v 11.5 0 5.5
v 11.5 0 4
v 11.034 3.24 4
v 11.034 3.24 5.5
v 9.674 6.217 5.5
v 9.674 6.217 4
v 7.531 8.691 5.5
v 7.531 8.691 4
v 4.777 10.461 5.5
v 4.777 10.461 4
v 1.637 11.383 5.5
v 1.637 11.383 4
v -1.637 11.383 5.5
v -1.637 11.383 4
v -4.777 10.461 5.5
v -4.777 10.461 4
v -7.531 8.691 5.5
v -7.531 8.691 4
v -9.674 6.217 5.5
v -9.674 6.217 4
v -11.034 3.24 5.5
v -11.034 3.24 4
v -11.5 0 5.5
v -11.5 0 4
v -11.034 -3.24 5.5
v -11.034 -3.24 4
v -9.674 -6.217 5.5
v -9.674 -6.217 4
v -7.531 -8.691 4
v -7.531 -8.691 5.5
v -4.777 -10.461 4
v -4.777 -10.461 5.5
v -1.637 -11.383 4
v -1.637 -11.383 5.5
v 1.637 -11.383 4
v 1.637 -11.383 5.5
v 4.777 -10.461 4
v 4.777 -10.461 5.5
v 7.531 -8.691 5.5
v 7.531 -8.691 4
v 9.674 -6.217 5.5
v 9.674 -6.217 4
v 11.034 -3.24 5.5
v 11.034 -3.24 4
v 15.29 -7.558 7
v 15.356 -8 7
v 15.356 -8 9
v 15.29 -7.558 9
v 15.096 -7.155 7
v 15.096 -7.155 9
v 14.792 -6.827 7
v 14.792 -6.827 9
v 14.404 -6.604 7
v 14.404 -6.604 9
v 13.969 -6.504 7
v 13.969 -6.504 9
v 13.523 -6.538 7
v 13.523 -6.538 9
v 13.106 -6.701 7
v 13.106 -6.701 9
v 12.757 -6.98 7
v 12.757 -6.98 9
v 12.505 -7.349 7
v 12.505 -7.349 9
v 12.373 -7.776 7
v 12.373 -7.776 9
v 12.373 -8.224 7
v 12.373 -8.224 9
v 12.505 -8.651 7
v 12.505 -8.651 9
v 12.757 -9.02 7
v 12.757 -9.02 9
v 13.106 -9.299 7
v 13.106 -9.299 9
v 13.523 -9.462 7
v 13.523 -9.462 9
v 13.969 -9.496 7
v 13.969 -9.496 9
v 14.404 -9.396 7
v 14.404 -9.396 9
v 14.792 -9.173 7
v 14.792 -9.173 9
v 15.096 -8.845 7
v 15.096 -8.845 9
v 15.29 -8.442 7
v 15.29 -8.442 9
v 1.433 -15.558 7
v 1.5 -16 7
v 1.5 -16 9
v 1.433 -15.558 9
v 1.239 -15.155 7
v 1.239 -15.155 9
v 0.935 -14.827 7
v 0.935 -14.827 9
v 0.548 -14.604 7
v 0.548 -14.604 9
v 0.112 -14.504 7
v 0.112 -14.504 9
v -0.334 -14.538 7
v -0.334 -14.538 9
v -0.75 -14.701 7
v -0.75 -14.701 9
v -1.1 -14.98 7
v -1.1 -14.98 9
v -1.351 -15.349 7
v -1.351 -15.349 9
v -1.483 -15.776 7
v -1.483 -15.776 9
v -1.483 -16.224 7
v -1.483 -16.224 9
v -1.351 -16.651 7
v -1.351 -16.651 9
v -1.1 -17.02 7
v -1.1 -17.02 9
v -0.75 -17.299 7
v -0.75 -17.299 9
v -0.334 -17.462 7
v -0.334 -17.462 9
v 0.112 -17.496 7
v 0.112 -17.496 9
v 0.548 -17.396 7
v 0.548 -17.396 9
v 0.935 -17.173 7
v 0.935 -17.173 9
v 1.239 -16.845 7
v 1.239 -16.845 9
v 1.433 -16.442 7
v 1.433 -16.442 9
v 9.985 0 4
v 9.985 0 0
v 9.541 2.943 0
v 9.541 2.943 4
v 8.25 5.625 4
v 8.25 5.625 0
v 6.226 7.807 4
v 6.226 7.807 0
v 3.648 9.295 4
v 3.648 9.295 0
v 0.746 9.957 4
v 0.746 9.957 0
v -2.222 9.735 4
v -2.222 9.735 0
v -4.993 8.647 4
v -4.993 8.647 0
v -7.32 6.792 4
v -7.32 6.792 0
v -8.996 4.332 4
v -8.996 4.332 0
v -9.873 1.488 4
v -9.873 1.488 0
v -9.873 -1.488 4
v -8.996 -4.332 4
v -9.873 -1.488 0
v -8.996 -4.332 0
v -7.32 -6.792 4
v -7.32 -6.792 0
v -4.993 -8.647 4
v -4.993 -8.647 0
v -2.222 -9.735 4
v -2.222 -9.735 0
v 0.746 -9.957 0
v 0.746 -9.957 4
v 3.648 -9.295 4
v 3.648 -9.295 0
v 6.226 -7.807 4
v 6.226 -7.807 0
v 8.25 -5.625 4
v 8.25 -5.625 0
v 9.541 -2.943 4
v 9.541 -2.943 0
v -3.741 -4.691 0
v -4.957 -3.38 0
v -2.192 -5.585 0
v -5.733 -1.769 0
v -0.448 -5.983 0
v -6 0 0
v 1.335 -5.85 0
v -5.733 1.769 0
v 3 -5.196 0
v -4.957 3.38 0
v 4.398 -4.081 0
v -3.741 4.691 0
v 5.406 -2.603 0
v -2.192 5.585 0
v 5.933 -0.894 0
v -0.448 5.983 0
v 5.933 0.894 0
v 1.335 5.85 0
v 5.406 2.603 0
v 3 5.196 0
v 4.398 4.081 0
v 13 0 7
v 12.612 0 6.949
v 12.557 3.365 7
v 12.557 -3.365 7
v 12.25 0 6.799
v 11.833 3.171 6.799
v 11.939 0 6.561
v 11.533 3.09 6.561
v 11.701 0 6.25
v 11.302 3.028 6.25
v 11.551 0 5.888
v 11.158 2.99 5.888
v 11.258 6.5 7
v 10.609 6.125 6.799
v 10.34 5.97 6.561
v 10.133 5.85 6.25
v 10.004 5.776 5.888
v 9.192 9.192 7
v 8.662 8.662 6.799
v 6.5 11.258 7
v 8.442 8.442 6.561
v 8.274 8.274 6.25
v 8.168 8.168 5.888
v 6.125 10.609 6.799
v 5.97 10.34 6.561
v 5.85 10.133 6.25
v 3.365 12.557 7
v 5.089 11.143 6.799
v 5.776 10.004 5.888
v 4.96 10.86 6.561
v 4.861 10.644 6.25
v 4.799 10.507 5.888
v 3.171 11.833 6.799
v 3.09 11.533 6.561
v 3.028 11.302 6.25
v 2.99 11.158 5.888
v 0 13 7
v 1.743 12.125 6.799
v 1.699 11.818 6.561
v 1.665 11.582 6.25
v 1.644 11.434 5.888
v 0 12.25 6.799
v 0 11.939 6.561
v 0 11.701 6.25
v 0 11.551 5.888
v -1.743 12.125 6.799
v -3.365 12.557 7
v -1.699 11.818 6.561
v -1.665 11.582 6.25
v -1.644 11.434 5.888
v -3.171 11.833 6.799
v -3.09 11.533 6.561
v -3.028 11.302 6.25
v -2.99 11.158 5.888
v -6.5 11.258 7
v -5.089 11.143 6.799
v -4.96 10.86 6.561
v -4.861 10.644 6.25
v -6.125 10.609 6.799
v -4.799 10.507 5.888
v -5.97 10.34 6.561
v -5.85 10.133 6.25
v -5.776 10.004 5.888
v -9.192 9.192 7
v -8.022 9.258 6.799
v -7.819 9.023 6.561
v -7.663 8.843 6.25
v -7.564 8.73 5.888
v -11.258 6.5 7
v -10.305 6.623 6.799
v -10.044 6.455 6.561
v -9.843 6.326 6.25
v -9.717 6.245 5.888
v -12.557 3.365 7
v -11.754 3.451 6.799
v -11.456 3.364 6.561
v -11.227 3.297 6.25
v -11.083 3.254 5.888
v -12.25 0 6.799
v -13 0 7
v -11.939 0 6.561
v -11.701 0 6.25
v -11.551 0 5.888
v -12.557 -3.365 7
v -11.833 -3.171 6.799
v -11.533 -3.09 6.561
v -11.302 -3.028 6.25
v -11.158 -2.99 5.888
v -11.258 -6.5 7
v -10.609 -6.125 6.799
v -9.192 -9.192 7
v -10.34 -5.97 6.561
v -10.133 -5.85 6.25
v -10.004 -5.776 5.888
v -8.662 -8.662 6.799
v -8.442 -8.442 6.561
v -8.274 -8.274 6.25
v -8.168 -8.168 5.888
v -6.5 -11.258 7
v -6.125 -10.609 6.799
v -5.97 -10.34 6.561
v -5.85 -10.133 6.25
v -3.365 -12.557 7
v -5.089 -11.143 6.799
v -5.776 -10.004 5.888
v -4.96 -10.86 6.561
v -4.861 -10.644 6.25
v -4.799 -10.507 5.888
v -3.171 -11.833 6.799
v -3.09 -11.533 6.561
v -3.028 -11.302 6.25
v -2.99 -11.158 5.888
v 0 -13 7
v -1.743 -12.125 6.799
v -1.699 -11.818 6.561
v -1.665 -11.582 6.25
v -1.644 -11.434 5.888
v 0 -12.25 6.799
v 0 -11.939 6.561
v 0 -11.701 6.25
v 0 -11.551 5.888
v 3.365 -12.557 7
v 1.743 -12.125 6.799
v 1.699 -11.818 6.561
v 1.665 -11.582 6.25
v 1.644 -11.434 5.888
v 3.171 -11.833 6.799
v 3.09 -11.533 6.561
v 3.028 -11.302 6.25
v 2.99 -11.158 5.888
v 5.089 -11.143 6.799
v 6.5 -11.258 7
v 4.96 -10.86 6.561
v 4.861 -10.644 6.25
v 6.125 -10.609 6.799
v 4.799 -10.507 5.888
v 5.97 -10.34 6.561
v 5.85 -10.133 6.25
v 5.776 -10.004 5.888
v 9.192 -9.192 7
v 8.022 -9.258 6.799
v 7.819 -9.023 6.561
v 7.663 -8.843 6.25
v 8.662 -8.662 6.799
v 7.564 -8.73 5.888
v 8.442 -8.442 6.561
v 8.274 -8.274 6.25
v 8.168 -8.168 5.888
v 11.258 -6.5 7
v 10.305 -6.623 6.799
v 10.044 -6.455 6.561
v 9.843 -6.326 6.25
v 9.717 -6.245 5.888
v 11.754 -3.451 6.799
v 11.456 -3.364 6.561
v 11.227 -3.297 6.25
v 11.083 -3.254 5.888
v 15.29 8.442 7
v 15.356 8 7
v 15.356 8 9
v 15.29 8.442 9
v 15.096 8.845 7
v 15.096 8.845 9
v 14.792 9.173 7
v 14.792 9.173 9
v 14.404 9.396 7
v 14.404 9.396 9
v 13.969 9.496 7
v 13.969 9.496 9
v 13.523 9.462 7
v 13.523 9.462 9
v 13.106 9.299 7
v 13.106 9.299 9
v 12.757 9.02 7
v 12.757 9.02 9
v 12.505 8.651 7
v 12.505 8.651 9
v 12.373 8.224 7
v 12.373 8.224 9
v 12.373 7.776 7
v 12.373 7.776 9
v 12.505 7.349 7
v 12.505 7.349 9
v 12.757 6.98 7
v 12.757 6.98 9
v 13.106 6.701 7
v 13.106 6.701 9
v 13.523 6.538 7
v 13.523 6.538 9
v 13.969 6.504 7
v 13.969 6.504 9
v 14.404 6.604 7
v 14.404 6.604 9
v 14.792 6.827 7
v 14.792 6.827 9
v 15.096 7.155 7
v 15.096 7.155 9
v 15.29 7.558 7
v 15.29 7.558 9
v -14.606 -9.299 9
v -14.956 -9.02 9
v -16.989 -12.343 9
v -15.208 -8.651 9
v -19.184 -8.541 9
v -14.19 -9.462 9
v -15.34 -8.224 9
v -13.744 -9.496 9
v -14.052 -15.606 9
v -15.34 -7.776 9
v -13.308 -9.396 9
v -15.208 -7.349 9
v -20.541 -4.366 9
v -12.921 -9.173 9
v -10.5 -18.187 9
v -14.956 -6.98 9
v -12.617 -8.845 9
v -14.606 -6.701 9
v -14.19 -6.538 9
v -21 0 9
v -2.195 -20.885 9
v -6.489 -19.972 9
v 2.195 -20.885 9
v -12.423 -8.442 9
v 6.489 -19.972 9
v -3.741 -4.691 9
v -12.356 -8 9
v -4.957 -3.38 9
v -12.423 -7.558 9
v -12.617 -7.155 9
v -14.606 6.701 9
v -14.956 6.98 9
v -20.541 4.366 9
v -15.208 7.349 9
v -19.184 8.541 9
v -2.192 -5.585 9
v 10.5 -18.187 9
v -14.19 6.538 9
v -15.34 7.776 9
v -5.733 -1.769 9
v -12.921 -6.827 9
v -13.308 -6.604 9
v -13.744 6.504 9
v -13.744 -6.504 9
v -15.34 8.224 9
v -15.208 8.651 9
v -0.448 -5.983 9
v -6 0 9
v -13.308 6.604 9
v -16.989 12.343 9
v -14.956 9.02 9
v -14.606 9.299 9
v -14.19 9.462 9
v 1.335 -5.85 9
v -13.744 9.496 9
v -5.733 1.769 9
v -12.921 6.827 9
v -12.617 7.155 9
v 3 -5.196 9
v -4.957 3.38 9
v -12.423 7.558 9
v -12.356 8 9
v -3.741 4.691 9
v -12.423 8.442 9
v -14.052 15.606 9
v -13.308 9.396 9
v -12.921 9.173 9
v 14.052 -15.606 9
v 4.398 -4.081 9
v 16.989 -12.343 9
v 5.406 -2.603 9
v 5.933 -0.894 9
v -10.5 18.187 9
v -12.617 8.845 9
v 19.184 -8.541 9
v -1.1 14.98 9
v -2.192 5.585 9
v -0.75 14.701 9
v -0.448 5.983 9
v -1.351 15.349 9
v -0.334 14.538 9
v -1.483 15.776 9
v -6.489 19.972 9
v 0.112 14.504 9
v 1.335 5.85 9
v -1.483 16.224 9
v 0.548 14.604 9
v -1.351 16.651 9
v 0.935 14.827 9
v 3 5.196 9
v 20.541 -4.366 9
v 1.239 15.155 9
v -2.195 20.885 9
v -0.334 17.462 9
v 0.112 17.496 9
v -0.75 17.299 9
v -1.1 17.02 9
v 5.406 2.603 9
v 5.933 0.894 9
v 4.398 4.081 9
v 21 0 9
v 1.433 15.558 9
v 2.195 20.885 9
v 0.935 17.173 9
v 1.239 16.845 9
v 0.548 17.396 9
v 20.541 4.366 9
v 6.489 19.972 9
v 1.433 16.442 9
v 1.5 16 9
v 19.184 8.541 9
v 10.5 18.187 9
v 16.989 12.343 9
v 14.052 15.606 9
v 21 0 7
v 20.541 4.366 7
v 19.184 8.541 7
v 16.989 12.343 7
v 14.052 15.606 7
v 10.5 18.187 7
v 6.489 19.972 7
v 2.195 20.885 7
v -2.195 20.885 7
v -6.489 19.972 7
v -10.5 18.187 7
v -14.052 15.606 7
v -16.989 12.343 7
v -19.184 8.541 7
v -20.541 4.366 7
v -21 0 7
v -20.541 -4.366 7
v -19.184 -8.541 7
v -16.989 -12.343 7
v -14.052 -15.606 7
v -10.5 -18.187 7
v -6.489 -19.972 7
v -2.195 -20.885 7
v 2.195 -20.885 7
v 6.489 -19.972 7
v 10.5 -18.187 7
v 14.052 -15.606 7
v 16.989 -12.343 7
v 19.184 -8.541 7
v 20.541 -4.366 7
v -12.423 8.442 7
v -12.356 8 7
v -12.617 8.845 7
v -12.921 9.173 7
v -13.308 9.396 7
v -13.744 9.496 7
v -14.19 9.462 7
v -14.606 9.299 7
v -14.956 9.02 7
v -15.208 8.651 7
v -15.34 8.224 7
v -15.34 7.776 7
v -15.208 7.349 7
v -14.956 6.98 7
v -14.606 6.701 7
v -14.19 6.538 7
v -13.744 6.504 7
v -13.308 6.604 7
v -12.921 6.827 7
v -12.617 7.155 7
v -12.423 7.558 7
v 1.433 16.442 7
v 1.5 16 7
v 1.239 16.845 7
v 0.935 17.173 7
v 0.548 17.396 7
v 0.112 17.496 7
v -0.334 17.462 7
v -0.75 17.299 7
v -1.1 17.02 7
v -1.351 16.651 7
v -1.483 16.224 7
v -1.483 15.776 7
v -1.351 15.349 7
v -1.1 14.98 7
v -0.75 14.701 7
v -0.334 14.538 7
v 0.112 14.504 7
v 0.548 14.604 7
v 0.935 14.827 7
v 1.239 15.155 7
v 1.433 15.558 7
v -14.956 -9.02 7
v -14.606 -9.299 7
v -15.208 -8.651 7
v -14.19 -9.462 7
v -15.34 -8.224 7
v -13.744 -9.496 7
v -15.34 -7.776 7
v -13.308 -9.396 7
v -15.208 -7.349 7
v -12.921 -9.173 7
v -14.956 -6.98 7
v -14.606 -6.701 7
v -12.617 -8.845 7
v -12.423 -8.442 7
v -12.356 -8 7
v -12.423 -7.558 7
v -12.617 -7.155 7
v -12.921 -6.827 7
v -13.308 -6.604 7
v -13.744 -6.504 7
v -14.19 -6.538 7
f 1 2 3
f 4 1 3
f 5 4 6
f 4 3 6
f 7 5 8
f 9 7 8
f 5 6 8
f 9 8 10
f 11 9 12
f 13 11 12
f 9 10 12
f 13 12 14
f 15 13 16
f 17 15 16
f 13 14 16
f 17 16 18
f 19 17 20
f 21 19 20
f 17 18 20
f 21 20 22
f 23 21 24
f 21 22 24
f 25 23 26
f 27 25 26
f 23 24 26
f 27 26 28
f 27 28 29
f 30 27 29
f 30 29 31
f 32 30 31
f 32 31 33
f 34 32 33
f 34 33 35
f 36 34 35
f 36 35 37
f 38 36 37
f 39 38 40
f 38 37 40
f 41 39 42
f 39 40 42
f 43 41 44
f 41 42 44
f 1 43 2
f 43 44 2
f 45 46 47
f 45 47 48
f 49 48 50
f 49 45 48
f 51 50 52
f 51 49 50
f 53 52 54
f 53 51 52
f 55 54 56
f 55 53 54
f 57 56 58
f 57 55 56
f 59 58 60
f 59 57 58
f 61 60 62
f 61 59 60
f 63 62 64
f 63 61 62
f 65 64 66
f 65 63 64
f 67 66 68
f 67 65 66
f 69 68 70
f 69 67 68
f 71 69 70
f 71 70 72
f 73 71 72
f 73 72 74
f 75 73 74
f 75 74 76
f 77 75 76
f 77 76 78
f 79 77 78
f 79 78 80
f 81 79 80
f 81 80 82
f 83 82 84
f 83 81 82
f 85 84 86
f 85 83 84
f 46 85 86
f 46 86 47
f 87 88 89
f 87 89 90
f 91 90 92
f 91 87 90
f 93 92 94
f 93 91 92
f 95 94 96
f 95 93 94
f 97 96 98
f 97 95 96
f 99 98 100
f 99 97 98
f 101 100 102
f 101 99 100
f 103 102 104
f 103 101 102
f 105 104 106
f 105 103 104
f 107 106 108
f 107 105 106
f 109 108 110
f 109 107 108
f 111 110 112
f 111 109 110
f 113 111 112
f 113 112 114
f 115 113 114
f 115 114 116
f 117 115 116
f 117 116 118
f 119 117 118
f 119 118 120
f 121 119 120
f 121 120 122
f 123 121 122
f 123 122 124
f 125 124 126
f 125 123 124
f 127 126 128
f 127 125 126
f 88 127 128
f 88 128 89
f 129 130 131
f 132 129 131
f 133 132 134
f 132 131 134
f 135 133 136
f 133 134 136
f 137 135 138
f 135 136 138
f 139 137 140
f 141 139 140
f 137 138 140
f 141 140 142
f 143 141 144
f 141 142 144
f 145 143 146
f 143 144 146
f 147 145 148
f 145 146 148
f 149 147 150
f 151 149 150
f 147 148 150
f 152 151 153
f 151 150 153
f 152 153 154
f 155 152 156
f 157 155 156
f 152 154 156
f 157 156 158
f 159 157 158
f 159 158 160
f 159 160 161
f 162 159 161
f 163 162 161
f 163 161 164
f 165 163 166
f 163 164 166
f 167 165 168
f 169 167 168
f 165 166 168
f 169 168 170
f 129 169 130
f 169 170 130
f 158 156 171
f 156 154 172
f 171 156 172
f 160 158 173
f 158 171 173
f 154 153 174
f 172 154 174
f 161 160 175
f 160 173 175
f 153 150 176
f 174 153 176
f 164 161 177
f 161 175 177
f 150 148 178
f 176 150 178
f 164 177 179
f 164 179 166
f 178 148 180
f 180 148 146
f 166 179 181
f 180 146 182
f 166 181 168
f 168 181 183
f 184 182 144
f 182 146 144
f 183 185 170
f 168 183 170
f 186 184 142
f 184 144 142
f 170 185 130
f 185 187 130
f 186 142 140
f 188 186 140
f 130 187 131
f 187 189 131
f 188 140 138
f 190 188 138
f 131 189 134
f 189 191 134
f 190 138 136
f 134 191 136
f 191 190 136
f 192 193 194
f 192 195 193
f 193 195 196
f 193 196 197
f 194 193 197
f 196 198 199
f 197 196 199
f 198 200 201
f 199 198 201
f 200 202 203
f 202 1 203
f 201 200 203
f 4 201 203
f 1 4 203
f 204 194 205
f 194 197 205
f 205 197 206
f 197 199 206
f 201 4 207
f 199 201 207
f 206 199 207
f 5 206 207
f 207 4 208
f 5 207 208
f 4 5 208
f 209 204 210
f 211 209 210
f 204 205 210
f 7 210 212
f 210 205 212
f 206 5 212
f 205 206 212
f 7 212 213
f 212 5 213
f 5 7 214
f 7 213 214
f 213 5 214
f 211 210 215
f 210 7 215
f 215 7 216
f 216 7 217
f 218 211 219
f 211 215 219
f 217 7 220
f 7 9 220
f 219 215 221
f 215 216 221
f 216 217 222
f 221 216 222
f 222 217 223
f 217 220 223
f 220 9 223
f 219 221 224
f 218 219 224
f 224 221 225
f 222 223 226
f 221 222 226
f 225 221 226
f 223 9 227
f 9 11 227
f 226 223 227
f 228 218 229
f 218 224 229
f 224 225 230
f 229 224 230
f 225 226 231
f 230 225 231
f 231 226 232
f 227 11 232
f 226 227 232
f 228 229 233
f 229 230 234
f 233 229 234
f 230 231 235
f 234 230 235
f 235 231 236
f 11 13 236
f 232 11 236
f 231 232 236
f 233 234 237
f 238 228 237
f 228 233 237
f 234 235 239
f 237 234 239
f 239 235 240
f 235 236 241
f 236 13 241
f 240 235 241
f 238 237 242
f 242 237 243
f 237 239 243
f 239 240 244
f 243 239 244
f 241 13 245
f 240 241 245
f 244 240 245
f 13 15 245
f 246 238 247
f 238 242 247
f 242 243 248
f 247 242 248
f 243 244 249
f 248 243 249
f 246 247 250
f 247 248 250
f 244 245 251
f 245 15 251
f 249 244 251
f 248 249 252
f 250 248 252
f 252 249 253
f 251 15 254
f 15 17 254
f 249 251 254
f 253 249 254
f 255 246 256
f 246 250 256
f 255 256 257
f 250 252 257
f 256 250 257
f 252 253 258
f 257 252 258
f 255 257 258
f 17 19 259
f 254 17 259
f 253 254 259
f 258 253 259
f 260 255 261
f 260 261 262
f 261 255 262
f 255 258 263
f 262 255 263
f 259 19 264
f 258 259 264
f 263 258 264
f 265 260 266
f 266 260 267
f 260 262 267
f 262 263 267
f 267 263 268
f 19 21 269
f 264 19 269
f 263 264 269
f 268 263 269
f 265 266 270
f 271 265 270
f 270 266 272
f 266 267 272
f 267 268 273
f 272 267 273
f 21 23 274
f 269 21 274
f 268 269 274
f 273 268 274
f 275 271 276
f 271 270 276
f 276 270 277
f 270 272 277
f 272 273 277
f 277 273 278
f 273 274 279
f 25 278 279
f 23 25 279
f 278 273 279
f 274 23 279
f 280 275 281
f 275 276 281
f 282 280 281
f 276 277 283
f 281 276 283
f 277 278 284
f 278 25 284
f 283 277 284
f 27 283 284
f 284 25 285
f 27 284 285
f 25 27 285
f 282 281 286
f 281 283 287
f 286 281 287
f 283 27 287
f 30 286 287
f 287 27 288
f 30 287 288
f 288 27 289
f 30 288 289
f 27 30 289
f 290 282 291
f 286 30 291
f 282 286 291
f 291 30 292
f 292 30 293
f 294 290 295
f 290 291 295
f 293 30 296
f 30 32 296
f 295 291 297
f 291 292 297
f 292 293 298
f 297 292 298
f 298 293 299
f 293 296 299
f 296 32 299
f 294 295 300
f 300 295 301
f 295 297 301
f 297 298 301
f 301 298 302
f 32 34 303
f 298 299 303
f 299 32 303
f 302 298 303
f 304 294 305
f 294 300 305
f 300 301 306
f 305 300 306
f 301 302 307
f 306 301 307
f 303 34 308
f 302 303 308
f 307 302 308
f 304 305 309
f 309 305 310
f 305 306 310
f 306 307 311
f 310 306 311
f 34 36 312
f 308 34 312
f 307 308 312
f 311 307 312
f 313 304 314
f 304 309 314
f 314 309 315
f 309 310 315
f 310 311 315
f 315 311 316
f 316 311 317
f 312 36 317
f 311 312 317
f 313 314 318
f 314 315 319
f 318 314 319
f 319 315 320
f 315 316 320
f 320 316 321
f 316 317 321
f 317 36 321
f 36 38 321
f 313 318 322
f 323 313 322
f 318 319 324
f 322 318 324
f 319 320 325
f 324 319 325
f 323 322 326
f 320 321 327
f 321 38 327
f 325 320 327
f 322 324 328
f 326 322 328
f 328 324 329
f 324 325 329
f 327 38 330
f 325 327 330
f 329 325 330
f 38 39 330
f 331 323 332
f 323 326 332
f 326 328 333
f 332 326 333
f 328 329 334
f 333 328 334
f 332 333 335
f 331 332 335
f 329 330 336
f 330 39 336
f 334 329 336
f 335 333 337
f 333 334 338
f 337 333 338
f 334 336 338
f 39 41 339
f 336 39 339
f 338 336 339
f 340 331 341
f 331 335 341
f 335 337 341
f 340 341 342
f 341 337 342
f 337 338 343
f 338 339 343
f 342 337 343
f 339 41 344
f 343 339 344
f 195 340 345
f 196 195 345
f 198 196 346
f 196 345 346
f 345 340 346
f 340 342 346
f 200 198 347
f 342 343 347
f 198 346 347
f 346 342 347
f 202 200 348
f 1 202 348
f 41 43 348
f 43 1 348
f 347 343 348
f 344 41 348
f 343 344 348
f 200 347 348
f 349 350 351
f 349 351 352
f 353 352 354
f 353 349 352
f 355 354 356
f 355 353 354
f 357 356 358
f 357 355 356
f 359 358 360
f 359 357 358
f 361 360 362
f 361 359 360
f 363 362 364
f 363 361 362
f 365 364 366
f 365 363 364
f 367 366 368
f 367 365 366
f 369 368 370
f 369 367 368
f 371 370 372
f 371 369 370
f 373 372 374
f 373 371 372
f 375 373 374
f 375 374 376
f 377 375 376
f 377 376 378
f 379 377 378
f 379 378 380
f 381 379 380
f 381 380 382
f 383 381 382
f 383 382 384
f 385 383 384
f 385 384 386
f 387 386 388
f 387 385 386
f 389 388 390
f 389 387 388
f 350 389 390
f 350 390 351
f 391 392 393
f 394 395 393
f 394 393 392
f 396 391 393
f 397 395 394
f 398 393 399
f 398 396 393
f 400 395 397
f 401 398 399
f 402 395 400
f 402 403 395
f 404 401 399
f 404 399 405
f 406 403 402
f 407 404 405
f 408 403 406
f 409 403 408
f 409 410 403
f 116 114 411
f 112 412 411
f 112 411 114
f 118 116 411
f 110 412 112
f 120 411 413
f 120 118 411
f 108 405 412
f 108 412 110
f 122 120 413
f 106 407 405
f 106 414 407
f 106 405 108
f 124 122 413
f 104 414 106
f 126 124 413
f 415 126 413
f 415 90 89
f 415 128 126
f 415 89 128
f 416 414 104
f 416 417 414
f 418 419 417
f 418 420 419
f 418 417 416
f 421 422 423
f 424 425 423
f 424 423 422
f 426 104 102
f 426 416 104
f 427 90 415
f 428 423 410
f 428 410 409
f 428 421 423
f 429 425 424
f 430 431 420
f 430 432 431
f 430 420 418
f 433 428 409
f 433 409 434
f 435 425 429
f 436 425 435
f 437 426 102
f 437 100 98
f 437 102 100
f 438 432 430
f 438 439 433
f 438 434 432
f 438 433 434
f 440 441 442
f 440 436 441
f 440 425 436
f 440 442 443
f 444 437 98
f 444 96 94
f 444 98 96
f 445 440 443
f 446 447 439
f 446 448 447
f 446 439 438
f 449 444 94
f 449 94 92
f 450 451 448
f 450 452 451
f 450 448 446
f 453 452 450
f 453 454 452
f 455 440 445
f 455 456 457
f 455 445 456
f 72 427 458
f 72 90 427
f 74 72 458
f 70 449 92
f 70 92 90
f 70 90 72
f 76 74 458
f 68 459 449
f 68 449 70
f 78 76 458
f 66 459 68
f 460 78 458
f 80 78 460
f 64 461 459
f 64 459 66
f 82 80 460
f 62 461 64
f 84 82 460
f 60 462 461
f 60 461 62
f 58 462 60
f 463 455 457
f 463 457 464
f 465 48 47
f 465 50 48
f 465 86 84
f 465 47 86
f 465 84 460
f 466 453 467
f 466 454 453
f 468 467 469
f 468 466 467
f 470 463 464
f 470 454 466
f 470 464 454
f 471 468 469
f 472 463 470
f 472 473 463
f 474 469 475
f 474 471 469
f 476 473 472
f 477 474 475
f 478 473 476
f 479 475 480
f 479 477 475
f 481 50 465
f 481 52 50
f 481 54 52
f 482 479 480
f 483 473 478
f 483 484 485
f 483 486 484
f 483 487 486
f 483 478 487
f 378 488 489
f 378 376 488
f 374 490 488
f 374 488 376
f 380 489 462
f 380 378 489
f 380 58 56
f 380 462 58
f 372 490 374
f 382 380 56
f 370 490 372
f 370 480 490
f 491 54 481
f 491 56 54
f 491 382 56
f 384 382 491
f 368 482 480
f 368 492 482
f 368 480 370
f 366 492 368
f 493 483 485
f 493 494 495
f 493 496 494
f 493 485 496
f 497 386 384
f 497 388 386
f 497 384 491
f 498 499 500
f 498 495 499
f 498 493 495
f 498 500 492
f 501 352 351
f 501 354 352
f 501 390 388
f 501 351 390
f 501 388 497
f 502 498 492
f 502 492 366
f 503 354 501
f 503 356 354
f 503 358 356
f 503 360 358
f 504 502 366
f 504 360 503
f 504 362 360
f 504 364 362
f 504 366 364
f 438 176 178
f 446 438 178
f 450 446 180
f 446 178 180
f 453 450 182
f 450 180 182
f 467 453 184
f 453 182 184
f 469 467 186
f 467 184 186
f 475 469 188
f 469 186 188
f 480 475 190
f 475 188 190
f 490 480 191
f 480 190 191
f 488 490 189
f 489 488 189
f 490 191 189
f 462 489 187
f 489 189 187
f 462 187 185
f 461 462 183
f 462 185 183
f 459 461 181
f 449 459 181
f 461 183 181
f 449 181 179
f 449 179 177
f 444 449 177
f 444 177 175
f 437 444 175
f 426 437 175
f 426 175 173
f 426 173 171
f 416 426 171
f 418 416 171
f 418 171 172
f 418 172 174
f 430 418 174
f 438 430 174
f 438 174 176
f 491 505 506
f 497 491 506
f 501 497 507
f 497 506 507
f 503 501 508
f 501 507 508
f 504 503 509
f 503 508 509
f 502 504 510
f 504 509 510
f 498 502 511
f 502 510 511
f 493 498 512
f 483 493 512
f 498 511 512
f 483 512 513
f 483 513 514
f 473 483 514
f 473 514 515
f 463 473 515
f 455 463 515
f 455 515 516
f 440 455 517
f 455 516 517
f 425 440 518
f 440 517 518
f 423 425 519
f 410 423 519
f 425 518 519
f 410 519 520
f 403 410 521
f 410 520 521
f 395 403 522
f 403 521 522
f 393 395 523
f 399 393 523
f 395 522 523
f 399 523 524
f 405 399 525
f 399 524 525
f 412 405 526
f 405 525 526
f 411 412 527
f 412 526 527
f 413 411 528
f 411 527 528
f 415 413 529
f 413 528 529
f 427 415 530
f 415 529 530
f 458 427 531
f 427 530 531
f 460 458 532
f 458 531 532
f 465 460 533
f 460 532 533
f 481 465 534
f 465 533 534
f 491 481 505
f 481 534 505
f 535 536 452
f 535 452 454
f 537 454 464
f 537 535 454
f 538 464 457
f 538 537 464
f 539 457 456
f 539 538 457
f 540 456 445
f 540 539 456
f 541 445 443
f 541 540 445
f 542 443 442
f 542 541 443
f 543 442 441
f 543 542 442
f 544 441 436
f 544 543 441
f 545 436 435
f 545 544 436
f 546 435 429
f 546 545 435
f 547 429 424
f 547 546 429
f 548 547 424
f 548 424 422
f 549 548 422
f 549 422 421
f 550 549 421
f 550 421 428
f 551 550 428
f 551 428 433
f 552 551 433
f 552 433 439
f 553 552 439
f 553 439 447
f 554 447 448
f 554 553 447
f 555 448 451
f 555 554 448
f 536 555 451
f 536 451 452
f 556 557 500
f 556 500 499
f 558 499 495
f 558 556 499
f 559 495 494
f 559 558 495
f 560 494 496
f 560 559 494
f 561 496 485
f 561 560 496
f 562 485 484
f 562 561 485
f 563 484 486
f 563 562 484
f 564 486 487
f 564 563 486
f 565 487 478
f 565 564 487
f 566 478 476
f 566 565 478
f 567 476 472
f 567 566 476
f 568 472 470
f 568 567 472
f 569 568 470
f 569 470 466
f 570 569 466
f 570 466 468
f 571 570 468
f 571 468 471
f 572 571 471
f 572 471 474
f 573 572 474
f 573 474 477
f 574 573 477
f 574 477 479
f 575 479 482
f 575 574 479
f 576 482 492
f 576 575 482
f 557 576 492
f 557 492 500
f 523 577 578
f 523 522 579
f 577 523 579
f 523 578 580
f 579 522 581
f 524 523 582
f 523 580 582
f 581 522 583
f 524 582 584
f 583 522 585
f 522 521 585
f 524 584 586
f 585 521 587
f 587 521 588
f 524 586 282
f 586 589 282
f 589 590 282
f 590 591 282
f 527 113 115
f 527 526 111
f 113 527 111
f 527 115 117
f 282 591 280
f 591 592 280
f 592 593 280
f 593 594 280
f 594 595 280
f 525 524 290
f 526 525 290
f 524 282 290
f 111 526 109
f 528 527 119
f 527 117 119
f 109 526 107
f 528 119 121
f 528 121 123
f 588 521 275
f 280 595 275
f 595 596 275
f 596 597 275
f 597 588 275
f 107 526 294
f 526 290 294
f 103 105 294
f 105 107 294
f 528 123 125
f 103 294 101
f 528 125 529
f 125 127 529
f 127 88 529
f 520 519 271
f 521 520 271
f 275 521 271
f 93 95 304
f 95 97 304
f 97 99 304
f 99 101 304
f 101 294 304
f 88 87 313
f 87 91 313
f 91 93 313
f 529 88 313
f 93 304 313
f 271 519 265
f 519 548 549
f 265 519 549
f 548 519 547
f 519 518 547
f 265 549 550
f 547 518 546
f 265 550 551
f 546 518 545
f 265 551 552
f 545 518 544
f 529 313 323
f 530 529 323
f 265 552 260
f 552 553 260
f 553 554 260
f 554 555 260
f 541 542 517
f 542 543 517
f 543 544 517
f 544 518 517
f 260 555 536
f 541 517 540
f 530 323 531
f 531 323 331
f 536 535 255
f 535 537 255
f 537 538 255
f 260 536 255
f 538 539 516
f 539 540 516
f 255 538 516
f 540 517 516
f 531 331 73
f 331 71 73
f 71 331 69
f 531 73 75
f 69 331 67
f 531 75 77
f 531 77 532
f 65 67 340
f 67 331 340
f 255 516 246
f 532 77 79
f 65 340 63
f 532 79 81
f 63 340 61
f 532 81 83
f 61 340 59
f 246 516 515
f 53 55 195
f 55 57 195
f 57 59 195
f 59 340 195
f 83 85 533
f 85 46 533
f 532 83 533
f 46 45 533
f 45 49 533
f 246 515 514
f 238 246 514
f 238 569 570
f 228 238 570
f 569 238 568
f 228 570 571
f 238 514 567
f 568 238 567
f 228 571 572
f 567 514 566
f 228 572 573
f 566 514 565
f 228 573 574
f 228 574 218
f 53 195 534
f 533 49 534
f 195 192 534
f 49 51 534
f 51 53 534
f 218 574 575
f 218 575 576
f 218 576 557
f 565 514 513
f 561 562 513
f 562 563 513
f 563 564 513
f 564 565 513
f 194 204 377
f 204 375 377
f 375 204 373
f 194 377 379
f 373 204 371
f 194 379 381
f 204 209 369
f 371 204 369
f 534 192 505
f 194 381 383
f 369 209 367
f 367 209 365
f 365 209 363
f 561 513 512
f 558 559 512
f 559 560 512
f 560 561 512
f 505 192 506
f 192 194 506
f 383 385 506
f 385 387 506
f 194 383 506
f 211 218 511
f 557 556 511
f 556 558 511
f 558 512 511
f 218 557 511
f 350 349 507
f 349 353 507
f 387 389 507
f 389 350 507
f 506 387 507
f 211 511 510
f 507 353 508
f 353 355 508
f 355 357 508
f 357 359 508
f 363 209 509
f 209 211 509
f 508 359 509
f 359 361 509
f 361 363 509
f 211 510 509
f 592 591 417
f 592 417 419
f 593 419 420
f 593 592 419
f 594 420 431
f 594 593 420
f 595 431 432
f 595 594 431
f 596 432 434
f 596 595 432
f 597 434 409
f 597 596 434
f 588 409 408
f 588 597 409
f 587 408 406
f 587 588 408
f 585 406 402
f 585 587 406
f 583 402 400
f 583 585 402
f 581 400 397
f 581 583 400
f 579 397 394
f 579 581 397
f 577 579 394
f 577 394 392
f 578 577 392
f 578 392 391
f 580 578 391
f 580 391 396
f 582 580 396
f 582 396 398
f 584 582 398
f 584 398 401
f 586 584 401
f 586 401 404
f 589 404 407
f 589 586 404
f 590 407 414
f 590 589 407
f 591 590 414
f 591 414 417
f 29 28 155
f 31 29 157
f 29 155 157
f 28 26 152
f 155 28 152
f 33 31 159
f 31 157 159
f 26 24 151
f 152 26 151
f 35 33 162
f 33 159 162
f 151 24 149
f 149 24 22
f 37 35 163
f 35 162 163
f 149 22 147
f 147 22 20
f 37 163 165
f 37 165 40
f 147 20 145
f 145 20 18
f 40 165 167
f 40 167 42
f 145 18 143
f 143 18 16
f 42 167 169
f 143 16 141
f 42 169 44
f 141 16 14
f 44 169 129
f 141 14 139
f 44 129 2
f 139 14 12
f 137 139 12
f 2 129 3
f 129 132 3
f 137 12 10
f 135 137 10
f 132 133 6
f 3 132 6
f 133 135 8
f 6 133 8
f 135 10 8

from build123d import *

# Parameters (mm, degrees)
SKETCH_1_R          = 9.985
EXTRUDE_1_DEPTH     = 4
SKETCH_2_R          = 11.5
EXTRUDE_2_DEPTH     = 3
SKETCH_3_R          = 21
SKETCH_3_R_2        = 1.5
EXTRUDE_3_DEPTH     = 2
SKETCH_4_R          = 6
CUT_EXTRUDE_1_DEPTH = 32.032241298
FILLET_1_R          = 1.5


with BuildPart() as part:
    # 草图1 → 凸台-拉伸1 (new body)
    with BuildSketch(Plane.XY):
        Circle(SKETCH_1_R)
    extrude(amount=EXTRUDE_1_DEPTH)

    # 草图2 → 凸台-拉伸2 (add)
    with BuildSketch(Plane.XY.offset(4)):
        Circle(SKETCH_2_R)
    extrude(amount=EXTRUDE_2_DEPTH)

    # 草图3 → 凸台-拉伸3 (add)
    with BuildSketch(Plane.XY.offset(7)):
        Circle(SKETCH_3_R)
        with Locations((0, 16)):
            Circle(SKETCH_3_R_2, mode=Mode.SUBTRACT)
        with Locations((13.856406461, 8)):
            Circle(SKETCH_3_R_2, mode=Mode.SUBTRACT)
        with Locations((13.856406461, -8)):
            Circle(SKETCH_3_R_2, mode=Mode.SUBTRACT)
        with Locations((0, -16)):
            Circle(SKETCH_3_R_2, mode=Mode.SUBTRACT)
        with Locations((-13.856406461, -8)):
            Circle(SKETCH_3_R_2, mode=Mode.SUBTRACT)
        with Locations((-13.856406461, 8)):
            Circle(SKETCH_3_R_2, mode=Mode.SUBTRACT)
    extrude(amount=EXTRUDE_3_DEPTH)

    # 草图4 → 切除-拉伸1 (cut, through all)
    with BuildSketch(Plane(origin=(0, 0, 0), x_dir=(-1, 0, 0), z_dir=(0, 0, -1))):
        Circle(SKETCH_4_R)
    extrude(amount=-CUT_EXTRUDE_1_DEPTH, mode=Mode.SUBTRACT)

    # 圆角1
    fillet_1_edges = [part.edges().sort_by_distance(p)[0] for p in [
        (-11.5, 0, 7),
    ]]
    fillet(fillet_1_edges, radius=FILLET_1_R)


solid = part.part
